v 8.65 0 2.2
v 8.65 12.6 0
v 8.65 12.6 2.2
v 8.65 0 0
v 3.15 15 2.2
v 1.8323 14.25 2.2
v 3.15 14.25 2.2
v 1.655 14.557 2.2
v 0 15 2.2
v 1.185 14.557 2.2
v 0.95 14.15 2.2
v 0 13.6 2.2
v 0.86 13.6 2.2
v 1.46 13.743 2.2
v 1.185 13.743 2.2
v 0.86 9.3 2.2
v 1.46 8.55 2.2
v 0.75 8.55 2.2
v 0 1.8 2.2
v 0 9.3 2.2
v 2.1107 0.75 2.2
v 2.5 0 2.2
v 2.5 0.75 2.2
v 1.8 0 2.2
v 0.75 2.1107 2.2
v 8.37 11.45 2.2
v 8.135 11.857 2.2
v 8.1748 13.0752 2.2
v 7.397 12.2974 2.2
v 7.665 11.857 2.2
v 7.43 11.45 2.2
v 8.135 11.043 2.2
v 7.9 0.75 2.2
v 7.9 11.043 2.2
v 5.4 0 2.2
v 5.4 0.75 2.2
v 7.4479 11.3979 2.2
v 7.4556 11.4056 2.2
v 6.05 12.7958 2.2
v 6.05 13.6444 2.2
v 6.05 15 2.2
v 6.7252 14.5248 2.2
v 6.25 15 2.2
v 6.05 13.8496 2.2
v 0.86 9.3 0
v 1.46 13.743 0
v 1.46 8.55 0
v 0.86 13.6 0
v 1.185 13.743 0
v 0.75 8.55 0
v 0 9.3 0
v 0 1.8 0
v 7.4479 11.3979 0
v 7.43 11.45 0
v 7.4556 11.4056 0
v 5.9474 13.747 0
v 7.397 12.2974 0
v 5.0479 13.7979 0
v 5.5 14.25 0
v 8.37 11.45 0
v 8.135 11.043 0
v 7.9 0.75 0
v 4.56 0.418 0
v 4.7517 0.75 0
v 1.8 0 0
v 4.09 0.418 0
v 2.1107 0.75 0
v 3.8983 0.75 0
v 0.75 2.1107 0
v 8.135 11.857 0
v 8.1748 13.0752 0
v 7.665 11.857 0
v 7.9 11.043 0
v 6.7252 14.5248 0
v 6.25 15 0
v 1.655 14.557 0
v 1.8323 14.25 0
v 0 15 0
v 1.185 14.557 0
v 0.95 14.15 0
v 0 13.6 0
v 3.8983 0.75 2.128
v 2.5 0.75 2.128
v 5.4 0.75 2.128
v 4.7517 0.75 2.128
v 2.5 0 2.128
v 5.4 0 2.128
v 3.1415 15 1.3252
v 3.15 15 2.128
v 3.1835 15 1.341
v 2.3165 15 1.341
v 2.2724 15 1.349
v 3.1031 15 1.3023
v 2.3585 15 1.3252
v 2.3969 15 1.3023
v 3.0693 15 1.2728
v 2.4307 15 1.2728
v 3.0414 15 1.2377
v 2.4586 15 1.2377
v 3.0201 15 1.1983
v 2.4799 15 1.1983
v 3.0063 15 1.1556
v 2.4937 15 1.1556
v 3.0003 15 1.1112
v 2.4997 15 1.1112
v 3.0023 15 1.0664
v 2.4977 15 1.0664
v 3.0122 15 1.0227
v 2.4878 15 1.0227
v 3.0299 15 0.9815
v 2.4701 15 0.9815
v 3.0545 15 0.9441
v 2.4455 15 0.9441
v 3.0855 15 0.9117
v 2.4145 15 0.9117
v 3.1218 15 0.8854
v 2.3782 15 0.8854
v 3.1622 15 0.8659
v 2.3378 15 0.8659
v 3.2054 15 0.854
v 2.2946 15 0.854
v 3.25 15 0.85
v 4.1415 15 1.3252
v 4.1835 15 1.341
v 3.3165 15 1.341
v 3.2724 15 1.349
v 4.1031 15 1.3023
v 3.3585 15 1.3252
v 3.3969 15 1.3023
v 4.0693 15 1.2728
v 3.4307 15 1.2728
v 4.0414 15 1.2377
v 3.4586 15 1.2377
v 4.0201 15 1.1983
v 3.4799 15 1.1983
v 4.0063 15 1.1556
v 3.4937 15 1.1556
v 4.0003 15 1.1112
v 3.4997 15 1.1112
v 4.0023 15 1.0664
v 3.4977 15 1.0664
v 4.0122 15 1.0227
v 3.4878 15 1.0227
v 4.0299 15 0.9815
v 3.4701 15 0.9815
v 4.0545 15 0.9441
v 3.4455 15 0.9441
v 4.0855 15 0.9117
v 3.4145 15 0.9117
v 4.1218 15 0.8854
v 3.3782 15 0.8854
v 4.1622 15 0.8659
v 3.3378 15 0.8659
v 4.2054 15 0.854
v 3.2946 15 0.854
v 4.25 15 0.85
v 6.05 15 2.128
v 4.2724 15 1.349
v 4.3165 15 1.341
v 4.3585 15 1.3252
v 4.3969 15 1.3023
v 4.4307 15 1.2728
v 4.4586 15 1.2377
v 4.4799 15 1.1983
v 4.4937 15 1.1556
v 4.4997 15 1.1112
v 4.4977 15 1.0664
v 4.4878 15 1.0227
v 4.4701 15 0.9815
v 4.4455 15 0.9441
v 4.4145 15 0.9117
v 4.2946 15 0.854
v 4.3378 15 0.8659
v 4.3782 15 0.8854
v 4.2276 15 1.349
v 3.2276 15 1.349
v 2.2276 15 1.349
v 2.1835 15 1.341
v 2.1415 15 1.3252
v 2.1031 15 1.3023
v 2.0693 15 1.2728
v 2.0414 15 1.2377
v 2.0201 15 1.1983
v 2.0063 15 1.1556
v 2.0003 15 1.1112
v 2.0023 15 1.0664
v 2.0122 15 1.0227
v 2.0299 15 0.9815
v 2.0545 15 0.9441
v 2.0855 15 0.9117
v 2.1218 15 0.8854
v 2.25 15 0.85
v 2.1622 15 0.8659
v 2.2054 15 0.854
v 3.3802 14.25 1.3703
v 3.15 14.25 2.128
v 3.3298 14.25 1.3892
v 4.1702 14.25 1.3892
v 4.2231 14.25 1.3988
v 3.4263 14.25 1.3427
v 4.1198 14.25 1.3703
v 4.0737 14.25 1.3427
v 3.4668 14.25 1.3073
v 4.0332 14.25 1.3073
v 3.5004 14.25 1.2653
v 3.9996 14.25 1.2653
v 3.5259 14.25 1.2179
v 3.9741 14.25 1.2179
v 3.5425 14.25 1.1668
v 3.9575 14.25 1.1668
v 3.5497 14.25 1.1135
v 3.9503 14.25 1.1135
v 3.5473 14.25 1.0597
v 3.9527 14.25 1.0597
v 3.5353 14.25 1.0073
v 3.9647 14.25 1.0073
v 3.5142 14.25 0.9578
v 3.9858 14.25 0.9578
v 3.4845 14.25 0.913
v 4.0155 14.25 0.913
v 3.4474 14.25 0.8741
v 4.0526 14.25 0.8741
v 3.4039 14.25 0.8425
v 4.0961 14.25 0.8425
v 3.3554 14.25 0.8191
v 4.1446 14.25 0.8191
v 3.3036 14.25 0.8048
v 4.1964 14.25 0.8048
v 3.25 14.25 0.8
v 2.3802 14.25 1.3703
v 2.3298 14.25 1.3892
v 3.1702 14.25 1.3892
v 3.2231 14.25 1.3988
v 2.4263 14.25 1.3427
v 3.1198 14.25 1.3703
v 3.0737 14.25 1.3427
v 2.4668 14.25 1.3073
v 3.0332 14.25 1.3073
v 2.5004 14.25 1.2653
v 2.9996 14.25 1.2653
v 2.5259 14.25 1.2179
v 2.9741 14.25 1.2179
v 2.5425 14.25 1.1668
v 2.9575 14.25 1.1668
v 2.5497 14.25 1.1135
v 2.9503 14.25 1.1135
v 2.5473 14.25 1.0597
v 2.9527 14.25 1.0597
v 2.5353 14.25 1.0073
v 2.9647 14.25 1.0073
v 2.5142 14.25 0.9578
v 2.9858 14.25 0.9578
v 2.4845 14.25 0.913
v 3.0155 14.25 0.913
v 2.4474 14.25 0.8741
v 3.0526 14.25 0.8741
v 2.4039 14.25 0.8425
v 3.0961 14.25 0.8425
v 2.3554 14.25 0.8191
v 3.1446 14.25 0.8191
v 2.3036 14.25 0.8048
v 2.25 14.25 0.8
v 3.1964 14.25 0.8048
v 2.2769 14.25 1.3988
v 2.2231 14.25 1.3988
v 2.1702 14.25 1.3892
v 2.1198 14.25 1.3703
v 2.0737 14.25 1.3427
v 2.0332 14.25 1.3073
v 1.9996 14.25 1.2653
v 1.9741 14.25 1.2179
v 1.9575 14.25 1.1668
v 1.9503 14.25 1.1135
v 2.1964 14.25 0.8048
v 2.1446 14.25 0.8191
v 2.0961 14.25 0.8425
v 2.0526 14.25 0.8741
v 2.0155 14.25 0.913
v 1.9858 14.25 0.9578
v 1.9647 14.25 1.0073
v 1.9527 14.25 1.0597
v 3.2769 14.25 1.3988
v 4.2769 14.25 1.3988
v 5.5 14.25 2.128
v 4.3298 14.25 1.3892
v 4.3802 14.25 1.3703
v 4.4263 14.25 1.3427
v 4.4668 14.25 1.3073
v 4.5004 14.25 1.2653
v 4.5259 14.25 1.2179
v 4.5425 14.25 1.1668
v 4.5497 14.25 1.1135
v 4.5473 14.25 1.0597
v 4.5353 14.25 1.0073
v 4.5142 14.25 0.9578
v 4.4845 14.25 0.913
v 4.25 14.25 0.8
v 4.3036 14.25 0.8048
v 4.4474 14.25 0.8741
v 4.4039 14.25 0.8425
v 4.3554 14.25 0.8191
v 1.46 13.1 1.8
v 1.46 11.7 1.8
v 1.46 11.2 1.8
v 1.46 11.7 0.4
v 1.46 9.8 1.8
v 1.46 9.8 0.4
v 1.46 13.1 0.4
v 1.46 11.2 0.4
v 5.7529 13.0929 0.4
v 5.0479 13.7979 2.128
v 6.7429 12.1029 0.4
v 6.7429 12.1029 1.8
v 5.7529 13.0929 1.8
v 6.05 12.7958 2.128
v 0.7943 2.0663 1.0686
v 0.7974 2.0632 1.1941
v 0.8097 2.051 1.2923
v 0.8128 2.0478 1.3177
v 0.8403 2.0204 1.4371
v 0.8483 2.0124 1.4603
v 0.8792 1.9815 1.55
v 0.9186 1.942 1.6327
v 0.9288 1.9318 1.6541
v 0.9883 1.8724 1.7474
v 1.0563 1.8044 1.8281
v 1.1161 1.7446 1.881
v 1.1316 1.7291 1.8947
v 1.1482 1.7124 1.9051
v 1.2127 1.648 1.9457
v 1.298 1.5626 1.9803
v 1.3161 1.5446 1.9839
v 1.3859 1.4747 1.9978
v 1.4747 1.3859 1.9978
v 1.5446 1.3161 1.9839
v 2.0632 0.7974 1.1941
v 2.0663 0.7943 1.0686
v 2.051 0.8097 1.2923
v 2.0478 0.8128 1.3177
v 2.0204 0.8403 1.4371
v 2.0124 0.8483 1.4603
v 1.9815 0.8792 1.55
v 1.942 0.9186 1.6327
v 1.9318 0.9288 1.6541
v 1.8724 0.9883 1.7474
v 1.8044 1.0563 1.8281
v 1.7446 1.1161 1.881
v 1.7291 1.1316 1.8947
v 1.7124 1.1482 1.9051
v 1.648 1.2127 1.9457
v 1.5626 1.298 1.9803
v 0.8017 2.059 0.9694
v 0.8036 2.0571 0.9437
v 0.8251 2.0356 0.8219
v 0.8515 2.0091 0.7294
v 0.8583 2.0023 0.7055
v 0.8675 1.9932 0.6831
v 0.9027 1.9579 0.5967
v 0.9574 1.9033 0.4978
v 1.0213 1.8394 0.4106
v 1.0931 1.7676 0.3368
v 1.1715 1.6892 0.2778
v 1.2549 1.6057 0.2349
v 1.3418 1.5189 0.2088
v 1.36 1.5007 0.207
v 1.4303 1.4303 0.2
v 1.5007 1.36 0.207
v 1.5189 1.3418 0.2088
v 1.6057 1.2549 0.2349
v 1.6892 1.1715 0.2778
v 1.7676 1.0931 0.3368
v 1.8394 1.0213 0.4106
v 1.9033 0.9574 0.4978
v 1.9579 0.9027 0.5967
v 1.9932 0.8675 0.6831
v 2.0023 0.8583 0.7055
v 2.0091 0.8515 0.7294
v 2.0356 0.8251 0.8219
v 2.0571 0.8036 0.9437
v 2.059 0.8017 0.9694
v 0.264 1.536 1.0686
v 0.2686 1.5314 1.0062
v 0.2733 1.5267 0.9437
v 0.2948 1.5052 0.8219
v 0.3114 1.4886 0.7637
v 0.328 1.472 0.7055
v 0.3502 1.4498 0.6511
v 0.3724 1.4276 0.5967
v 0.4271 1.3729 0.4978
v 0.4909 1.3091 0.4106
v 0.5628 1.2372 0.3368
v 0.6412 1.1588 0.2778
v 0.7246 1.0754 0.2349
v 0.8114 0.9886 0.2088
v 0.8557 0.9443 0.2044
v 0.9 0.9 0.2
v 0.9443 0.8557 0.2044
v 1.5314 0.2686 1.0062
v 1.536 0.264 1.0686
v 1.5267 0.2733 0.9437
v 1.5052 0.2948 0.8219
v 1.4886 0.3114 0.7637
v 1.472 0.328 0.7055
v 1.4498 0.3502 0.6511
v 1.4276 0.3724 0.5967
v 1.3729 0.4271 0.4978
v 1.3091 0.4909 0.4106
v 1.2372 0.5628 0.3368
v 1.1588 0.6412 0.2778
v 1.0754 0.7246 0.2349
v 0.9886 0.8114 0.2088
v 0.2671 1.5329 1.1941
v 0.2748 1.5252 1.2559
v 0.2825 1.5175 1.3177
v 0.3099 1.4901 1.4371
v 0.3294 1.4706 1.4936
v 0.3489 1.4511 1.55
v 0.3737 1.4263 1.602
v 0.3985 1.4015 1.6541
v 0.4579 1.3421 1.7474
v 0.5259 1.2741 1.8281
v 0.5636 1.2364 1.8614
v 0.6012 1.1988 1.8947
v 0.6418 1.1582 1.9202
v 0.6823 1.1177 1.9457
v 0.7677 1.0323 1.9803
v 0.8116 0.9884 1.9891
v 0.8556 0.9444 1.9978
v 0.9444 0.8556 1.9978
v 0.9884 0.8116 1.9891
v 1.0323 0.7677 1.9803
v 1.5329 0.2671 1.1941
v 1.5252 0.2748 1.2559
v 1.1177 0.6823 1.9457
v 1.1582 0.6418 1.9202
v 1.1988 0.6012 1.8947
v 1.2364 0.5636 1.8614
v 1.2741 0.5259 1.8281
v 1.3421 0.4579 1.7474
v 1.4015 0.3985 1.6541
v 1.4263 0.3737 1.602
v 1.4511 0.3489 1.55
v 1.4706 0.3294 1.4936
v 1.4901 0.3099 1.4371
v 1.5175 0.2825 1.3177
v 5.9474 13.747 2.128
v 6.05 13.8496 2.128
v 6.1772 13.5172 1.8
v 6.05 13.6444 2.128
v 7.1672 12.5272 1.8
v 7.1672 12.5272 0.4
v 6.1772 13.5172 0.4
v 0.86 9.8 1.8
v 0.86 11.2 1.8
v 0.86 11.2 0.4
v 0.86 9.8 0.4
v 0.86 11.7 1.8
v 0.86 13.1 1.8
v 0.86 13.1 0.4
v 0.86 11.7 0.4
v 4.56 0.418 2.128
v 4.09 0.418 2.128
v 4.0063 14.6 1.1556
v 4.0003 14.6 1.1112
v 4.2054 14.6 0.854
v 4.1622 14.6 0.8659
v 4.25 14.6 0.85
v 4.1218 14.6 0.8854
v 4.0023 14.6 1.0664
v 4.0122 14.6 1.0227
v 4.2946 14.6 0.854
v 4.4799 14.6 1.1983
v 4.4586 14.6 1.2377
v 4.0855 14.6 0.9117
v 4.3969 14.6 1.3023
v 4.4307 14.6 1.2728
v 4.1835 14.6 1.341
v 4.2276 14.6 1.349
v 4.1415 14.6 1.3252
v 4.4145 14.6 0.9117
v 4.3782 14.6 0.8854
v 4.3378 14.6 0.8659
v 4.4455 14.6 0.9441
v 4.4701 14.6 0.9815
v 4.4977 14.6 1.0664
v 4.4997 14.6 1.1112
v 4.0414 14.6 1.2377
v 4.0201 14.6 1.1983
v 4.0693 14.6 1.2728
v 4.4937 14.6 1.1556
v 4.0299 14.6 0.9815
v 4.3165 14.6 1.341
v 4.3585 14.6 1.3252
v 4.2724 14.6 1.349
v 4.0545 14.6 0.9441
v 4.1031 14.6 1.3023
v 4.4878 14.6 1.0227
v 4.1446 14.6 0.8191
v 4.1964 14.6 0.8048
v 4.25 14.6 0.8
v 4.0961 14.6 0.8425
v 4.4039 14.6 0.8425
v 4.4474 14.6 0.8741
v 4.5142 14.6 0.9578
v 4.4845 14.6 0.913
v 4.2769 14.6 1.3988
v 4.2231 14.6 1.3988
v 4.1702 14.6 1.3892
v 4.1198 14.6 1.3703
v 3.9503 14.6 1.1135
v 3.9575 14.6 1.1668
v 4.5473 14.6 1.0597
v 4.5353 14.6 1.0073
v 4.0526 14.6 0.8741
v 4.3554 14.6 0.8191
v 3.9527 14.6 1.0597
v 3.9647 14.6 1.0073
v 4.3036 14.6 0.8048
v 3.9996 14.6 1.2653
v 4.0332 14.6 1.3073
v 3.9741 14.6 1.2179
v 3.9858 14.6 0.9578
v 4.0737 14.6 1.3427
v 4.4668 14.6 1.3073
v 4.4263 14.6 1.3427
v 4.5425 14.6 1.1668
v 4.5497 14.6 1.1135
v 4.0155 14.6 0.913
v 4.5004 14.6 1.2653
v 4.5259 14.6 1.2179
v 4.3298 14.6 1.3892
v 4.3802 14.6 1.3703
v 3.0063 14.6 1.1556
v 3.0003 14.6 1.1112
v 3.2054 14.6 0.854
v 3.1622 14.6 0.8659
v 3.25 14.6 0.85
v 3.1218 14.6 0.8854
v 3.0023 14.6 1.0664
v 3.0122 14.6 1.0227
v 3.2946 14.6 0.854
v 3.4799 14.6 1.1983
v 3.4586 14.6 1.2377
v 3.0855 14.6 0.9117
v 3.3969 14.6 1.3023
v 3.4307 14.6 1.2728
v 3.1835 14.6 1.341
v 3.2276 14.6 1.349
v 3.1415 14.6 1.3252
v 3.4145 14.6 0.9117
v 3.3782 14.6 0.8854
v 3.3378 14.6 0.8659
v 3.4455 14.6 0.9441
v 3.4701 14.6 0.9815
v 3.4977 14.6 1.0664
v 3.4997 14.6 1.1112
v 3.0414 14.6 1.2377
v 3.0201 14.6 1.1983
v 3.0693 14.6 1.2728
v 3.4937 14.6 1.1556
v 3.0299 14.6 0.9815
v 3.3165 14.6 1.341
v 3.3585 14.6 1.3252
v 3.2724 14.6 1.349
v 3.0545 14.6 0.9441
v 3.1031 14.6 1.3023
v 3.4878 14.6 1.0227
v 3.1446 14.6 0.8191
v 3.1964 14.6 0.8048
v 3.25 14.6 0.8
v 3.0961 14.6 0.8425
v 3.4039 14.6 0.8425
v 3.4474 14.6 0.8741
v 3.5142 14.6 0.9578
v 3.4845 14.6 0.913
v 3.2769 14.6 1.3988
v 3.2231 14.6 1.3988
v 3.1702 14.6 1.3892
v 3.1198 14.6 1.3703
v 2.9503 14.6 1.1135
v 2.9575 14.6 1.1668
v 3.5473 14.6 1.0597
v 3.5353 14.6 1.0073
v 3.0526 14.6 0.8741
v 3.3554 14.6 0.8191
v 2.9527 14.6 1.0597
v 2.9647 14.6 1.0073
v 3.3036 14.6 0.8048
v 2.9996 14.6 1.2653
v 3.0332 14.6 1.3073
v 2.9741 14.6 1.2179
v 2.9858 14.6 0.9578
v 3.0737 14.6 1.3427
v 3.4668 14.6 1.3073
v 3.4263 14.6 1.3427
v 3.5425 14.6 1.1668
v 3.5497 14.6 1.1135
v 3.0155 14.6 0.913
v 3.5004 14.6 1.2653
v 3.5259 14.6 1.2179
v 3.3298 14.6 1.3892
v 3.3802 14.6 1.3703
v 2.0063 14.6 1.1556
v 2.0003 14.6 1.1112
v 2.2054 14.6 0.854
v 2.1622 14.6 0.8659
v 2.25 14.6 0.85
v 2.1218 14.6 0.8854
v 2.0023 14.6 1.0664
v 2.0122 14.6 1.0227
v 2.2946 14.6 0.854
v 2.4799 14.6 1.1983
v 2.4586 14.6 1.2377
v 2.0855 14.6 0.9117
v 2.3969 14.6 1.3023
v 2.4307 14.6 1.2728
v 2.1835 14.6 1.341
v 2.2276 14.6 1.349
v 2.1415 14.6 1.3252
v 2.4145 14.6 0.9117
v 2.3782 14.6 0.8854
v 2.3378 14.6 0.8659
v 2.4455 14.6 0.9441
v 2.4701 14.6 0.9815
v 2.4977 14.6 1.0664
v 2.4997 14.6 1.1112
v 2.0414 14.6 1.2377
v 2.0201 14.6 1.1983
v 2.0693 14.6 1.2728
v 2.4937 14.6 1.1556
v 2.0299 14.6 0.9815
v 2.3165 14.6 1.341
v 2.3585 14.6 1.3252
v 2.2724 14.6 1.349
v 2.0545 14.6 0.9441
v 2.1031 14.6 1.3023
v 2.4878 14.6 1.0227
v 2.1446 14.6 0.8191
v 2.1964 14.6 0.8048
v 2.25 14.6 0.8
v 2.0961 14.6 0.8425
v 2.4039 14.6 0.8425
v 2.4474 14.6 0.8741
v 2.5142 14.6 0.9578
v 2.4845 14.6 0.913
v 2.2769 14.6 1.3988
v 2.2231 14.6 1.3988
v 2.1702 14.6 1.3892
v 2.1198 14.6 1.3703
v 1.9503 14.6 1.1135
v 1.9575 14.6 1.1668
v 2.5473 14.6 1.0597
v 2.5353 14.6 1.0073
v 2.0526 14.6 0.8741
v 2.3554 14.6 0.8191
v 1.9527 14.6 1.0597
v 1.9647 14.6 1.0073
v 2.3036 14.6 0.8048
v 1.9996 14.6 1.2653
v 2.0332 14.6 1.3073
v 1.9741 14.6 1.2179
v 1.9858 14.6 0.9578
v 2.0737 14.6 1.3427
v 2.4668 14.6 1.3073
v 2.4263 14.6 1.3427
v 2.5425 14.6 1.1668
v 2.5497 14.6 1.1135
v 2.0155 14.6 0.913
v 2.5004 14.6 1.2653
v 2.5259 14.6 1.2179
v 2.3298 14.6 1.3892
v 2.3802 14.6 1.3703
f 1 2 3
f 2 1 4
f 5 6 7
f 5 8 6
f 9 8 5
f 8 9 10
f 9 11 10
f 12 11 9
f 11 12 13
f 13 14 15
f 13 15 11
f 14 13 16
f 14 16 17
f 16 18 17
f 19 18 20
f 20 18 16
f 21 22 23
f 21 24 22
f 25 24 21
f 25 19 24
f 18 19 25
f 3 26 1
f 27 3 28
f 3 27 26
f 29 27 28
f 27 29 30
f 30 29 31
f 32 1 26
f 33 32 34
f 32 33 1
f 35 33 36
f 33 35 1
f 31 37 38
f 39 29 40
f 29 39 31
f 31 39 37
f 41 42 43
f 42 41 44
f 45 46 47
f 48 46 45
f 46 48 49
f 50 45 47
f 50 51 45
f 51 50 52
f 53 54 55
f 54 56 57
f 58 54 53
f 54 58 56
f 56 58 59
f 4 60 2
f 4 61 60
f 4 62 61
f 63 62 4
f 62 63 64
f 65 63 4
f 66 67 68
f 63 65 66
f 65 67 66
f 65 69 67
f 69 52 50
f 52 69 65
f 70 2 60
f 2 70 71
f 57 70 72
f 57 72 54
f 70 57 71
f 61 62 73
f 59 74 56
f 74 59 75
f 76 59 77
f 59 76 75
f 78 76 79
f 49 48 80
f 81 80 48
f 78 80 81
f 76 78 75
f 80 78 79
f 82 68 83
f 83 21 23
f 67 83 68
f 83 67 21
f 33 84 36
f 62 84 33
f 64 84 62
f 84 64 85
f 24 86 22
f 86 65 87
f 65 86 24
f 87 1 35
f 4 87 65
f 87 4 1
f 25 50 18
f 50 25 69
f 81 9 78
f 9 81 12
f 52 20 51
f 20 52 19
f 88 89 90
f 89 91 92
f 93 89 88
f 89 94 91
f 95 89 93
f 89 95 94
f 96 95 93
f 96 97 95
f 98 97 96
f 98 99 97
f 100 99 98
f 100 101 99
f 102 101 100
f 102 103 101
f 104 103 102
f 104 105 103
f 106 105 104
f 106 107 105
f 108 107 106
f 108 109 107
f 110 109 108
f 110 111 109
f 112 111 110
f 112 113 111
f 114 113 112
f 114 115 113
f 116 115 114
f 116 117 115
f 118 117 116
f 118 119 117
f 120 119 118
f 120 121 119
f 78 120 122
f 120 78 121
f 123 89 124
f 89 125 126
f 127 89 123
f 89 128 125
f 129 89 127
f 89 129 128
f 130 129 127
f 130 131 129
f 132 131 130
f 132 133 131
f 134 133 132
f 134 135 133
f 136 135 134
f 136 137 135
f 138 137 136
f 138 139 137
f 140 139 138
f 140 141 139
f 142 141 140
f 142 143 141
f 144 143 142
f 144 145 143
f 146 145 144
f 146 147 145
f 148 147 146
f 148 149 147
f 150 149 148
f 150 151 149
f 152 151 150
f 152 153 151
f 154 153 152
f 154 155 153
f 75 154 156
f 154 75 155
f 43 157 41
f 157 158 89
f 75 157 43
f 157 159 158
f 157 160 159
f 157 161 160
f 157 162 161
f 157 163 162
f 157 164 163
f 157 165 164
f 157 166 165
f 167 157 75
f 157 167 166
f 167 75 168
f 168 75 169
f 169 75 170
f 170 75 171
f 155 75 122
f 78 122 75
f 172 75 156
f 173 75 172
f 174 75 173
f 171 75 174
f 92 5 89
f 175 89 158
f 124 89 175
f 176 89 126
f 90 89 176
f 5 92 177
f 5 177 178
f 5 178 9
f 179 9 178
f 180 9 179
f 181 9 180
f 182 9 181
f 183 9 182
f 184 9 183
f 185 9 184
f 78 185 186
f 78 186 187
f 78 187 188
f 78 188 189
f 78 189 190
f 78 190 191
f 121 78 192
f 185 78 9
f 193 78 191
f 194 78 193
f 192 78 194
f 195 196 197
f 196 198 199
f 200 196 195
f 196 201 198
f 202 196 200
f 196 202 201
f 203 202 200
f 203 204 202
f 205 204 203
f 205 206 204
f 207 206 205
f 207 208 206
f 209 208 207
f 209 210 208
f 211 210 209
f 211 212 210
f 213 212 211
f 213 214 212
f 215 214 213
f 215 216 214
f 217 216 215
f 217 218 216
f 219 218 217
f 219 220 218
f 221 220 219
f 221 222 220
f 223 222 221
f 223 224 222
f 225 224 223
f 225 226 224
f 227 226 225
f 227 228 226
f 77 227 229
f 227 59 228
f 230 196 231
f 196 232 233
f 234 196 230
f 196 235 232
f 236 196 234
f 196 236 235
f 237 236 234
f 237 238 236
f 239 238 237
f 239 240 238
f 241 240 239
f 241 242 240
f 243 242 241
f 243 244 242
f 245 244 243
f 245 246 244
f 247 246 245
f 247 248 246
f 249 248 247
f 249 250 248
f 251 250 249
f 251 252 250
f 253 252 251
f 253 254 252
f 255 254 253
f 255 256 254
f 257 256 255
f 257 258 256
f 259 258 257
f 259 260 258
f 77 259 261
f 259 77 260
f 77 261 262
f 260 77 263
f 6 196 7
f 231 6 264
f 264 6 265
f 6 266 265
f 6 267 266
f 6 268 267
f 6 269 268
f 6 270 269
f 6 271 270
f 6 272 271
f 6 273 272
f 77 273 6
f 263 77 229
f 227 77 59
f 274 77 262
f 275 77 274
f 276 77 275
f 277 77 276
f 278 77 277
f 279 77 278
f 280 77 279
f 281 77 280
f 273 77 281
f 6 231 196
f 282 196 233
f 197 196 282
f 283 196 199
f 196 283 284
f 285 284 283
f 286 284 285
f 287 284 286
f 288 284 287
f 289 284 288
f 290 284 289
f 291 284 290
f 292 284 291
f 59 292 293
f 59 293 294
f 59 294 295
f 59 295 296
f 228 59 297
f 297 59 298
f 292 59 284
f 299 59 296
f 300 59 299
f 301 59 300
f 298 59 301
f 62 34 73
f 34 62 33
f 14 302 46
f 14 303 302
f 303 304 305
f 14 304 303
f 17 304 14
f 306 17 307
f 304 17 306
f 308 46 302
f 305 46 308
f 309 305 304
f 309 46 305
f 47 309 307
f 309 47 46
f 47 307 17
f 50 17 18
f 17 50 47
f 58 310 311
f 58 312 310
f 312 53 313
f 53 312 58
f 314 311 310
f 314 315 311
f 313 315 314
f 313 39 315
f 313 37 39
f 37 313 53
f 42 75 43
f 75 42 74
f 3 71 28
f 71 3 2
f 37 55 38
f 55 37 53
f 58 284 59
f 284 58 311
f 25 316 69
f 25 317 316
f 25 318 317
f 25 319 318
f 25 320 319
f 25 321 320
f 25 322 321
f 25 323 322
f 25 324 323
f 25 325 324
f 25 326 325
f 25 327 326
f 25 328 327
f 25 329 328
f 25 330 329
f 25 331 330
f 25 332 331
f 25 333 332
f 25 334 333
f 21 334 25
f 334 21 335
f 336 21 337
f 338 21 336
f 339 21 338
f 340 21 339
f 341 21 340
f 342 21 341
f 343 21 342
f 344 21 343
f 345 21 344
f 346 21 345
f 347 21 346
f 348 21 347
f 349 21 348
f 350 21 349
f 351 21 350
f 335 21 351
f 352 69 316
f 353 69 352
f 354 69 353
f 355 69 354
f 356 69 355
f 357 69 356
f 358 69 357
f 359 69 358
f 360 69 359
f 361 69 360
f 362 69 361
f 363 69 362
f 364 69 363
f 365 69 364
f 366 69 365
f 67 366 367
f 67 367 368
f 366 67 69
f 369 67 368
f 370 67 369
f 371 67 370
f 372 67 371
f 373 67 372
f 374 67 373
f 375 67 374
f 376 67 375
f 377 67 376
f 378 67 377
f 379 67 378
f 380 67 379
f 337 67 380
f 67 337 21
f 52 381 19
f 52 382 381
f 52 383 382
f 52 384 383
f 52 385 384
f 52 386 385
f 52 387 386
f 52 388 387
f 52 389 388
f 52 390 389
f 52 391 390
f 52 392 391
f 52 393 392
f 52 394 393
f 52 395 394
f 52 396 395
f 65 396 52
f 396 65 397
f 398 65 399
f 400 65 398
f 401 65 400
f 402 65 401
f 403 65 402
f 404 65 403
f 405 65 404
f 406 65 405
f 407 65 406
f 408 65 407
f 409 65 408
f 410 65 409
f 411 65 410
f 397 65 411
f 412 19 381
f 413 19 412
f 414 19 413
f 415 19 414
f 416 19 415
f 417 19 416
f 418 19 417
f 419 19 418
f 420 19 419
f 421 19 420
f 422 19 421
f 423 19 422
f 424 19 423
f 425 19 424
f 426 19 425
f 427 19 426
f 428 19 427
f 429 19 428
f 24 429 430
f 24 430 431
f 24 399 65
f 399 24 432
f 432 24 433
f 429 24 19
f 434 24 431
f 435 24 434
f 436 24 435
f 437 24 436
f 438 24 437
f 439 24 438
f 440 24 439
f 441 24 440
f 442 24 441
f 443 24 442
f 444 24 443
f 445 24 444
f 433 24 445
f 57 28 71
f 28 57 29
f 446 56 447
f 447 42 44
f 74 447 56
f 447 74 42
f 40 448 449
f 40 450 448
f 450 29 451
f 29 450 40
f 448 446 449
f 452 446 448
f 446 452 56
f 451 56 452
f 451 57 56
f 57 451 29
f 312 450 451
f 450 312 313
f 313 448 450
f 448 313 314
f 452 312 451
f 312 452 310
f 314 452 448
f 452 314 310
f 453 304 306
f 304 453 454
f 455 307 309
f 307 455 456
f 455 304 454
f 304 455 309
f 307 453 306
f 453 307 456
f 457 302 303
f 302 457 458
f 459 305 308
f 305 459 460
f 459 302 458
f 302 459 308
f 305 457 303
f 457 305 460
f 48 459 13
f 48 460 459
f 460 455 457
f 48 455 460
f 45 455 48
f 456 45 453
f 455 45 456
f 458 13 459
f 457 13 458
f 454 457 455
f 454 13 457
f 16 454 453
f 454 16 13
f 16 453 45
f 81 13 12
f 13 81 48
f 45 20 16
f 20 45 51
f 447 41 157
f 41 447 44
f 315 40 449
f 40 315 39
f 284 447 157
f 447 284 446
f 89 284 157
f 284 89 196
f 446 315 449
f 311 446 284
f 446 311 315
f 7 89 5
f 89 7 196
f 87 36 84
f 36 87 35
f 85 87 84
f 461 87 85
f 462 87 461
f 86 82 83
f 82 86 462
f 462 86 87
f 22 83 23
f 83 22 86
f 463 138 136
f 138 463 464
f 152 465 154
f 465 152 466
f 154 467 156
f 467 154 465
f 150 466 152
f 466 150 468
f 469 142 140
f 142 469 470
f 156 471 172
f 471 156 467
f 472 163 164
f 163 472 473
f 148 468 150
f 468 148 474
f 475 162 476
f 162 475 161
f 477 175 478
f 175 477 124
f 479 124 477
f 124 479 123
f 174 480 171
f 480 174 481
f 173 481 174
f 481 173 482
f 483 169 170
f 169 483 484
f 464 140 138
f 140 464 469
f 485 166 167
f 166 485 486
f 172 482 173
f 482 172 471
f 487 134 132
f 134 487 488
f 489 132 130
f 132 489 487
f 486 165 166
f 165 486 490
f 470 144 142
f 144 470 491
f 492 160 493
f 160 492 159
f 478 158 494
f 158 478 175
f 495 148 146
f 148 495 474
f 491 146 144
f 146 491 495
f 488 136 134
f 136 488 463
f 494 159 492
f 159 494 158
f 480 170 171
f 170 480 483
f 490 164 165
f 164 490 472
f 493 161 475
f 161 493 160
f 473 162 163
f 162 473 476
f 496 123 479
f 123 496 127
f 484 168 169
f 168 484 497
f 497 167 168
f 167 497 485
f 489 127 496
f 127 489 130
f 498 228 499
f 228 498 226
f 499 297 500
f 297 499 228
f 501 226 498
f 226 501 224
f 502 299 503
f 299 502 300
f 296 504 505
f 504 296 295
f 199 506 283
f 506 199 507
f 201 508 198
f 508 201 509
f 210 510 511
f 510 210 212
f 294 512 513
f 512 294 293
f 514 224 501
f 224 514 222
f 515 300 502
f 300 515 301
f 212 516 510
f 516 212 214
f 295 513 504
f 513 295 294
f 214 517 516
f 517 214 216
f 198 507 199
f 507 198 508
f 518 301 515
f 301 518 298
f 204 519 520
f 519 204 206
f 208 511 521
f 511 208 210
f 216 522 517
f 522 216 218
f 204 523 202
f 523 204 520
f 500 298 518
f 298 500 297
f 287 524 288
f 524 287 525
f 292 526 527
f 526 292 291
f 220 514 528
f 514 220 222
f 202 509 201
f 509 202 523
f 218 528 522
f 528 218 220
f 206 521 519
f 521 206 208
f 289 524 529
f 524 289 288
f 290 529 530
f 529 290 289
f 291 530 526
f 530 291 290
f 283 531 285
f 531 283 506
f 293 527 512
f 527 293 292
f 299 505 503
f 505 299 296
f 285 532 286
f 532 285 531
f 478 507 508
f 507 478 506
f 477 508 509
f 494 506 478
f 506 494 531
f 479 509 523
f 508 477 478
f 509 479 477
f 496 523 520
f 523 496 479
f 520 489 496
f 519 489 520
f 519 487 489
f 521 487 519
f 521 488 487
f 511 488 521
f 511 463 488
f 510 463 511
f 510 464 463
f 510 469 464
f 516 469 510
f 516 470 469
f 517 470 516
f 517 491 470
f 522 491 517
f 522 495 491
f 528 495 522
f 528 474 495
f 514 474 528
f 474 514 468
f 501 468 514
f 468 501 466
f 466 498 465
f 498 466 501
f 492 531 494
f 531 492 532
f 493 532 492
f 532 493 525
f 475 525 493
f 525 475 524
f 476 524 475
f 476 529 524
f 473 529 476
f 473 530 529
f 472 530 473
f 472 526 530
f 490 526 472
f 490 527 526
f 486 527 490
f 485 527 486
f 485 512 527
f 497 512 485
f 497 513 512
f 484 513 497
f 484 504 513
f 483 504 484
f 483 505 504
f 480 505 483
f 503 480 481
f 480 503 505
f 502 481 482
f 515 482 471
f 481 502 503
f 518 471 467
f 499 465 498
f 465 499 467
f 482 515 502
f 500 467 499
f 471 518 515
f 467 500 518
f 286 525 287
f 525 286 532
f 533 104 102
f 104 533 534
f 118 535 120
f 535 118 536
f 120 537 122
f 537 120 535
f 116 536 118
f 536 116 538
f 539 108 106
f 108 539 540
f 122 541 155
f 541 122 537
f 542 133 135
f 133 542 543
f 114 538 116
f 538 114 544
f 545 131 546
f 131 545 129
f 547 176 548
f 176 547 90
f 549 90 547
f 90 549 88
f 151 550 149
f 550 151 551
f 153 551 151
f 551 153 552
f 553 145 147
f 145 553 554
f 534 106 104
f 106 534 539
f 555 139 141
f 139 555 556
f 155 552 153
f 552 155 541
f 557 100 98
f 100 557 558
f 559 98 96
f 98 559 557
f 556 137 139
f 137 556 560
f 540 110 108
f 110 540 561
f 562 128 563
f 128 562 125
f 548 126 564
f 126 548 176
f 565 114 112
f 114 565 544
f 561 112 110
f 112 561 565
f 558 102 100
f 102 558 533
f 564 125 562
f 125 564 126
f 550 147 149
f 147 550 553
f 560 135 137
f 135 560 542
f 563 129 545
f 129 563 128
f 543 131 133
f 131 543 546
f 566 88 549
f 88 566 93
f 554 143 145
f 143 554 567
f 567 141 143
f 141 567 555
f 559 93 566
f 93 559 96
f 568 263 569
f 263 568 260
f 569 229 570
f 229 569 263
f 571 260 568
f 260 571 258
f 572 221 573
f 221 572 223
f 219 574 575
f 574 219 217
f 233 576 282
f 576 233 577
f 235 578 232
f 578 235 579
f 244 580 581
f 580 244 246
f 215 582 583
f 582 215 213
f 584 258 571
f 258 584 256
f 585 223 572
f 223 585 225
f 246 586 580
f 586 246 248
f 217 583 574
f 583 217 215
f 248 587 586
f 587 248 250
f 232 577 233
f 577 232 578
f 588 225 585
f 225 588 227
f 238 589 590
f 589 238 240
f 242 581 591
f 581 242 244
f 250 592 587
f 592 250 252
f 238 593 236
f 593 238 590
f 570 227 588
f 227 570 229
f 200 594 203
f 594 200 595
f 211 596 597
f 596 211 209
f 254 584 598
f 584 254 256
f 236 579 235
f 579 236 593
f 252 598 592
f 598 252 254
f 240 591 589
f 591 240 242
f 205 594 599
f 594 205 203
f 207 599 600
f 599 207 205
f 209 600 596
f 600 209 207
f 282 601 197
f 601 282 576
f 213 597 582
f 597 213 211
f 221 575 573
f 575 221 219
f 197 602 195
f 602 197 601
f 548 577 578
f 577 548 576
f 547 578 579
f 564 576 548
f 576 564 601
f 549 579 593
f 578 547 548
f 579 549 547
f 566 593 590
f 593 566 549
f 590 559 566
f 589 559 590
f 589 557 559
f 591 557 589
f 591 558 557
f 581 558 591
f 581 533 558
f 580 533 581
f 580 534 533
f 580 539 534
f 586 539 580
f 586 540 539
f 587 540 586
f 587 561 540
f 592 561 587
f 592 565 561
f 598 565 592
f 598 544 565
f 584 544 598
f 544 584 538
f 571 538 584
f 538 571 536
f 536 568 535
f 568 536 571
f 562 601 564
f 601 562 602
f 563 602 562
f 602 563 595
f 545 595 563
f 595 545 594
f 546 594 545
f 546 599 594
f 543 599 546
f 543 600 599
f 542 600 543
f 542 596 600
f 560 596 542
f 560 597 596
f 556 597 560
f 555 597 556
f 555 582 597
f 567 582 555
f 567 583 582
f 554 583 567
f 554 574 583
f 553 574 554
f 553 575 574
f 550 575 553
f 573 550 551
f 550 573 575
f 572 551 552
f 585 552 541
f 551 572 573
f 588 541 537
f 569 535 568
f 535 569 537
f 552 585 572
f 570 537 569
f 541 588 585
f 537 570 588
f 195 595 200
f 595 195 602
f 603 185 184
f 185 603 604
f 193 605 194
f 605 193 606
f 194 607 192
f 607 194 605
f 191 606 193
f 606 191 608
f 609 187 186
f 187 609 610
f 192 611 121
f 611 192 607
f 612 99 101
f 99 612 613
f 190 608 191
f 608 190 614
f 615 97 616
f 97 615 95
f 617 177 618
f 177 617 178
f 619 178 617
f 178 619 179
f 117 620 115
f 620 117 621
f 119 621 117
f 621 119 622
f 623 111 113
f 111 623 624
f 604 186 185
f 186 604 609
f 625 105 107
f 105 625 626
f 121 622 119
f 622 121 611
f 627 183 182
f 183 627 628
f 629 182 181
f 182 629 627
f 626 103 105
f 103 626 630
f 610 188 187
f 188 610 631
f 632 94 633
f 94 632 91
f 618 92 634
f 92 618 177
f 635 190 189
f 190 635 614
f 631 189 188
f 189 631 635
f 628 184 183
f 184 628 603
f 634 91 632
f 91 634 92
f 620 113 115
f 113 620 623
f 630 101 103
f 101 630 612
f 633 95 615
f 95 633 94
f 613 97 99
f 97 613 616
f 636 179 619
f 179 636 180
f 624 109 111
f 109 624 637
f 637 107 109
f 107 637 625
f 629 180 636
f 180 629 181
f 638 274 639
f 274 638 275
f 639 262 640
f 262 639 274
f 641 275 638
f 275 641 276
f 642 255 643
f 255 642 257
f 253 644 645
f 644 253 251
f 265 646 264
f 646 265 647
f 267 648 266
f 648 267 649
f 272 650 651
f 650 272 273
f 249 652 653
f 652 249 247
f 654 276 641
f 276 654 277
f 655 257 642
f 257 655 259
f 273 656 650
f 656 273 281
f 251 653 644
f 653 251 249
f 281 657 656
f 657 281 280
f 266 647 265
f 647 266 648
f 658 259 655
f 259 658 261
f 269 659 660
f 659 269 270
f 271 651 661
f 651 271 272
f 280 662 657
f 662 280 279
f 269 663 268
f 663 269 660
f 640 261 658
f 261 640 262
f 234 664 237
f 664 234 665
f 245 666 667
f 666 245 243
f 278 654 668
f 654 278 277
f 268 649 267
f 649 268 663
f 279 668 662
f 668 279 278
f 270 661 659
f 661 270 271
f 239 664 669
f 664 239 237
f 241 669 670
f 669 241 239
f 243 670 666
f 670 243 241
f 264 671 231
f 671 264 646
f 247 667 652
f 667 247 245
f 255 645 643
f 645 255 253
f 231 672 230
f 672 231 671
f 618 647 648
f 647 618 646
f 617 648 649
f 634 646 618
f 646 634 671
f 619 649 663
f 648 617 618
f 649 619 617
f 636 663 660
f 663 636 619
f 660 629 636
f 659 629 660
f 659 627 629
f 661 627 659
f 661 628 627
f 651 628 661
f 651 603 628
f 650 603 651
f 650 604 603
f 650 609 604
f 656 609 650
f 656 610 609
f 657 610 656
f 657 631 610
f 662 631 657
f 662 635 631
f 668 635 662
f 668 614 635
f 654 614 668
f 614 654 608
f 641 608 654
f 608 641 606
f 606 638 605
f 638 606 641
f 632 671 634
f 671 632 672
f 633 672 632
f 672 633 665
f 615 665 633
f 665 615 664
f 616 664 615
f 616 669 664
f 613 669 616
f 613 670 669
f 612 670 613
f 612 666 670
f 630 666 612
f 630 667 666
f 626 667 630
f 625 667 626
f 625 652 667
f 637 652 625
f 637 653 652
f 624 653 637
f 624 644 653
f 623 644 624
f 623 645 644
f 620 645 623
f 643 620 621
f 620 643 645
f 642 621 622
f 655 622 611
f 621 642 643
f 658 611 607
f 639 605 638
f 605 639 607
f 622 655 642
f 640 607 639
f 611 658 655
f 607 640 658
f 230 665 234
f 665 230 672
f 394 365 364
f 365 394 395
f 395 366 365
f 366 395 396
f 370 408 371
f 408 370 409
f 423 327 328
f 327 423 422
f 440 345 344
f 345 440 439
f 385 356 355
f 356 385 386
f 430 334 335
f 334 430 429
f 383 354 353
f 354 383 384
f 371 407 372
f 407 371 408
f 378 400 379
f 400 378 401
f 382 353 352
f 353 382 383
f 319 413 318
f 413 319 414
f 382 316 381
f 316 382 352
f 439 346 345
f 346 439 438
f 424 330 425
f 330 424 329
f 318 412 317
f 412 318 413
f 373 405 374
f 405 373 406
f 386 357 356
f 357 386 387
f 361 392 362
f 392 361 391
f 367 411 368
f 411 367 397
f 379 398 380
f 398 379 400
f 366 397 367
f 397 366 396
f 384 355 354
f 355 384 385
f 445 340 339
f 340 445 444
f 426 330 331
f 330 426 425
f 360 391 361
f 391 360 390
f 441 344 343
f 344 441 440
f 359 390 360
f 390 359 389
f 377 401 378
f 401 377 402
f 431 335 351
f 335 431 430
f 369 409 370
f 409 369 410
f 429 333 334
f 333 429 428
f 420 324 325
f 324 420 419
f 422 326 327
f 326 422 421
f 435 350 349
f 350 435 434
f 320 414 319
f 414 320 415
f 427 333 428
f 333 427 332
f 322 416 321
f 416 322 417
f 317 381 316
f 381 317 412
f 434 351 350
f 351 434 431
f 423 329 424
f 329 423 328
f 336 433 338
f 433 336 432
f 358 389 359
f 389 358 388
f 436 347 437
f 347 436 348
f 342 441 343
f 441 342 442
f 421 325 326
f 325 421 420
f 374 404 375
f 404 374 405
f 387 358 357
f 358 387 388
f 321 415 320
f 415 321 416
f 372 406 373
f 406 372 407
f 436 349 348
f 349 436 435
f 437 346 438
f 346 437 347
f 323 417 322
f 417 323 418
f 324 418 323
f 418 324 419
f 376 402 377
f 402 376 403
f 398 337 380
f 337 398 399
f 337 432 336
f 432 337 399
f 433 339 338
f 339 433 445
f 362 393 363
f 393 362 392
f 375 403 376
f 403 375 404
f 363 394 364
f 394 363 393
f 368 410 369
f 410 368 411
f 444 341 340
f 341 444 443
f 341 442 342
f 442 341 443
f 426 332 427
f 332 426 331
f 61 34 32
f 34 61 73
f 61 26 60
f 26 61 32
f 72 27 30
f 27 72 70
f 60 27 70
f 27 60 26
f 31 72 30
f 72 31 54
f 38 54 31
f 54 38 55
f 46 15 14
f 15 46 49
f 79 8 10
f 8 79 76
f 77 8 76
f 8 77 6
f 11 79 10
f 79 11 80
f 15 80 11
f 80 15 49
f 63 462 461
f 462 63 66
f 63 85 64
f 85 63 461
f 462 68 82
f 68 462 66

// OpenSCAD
module Plate(){ color("grey")
        translate([-0.5, -0.5, -0.2]) cube([w0+1,l0+1, 0.2]);
}


module Walls2(){
    len0 = PowerCornerLen;
    translate([len0,0,0]) cube([w0-len0, wall, h0]);
    translate([0,len0,0]) cube([wall,l0-len0,h0]);
    translate([0, l0-wall, 0]) cube([w0-ToggleCornerLen, wall, h0]);
    translate([w0-wall, 0, 0]) cube([wall, l0-ToggleCornerLen, h0]);
    
    add0 = max( 0,(ThrottleDepth-wall)+0.6);
    thickbar = ThrottleSocketWidth+ThrottleLowering;
    translate([wall, l0-(thickbar+wall), 0]) cube([add0,thickbar,h0]);
    
    add1 = max( 0,(ToggleDepth-wall)+0.6);
    translate([w0-ToggleCornerLen, l0, 0.0]) rotate(180+45) cube([wall+add1, sqrt(2)*ToggleCornerLen, h0]);
    
    translate([0,len0,0]) rotate(-45) cube([len0*sqrt(2),wall,h0]);
}



module ToggleSocket() {
                 translate([0,1.5-ToggleDepth,0]) cube([ToggleSocketWidth,3,h0+1], center= true);
    color("red") translate([0,0-ToggleDepth,0]) cube([1.4,2,1.4], center = true);
}


module ThrottleSocket() {
    wid = ThrottleSocketWidth;
    spare = wid-(1.4*2);
    gap = spare/3;
    h = h0/2 - 1.4/2;
    color("red") translate([-1, gap, h]) cube([ThrottleDepth+1+wall+0.1, 1.4, 1.4]);
    color("red") translate([-1, gap+1.4+gap, h]) cube([ThrottleDepth+1+wall+0.1, 1.4, 1.4]);
    color("green") translate([-1, 0, -h0/2]) cube([ThrottleDepth+1, ThrottleSocketWidth , h0*2]);
}


module StrapClips() {
    translate([w0-(ToggleCornerLen+StrapWidth+0.2), l0-wall*5+0.1, h0-StrapH]) cube([StrapWidth, wall*5, StrapH+0.02]);
    translate([PowerCornerLen+0.7, -0.1, h0-StrapH]) cube([StrapWidth, wall+0.5, StrapH+0.02]);
}

module LedSocket() {
    r = ledRadius1;
    r2 = ledRadius2;
    dd = 0.1;
    l = wall*2;
    l2 = l-(0.4+dd);
    translate([0,-l+dd,0]) rotate([-90,90]) cylinder(l,r,r, $fn=35);
    translate([0,-l+dd,0]) rotate([-90,90]) cylinder(l2,r2,r2, $fn=35);
    //translate([0,-0.4,h0*0.65]) rotate([-90,90]) cylinder(0.4,r2/2,r2/2, $fn=25);
    
}

module ScrewHole() {
    translate([0,0,-0.05]) cylinder(h0+0.1, 0.94/2, 0.94/2, $fn = 6);
}




module Final() {
    difference(){
        Walls2();
        translate([w0-(ToggleCornerLen/2), l0-(ToggleCornerLen/2), h0/2]) rotate(-45) ToggleSocket();
        translate([0,l0-(ThrottleSocketWidth+ThrottleLowering),0]) ThrottleSocket();
        r = PowerButtonDiameter/2;
        l = PowerCornerLen*sqrt(2);
        translate([0,0,h0/2]) rotate([-45,90]) cylinder(l,r,r, $fn=45);
        StrapClips();
        translate([w0-(ToggleCornerLen+2), l0, (h0/12)*6]) LedSocket();
        translate([w0-(ToggleCornerLen+3), l0, (h0/12)*6]) LedSocket();
        translate([w0-(ToggleCornerLen+4), l0, (h0/12)*6]) LedSocket();
        translate([w0-wall,l0-(wall+0.4+ToggleCornerLen),0]) ScrewHole();
        //translate([w0-wall*1.2,wall*1.2,0]) ScrewHole();
        translate([wall+0.67,l0-wall-0.1,0]) ScrewHole();
        translate([w0*0.5,wall*1.1,0]) ScrewHole();
        
    }
    
}


wall = 0.75;
ToggleCornerLen = 2.4;
PowerCornerLen = 1.8;
h0 = 2.2;
w0 = 8.65;//8.3
l0 = 15;//14.25

ToggleDepth= 1.1;
ToggleSocketWidth = 2.05;

ThrottleDepth = 0.86;
ThrottleSocketWidth = 4.3;
ThrottleLowering = 1.4;

PowerButtonDiameter = 1.8;

ledRadius1 = 0.5/2;
ledRadius2 = 0.6/2;

StrapWidth = 2.9;
StrapH = 0.072;


//color("SlateGrey") Plate();

color([1.0,0.2,0.0]) Final();
//LedSocket();
